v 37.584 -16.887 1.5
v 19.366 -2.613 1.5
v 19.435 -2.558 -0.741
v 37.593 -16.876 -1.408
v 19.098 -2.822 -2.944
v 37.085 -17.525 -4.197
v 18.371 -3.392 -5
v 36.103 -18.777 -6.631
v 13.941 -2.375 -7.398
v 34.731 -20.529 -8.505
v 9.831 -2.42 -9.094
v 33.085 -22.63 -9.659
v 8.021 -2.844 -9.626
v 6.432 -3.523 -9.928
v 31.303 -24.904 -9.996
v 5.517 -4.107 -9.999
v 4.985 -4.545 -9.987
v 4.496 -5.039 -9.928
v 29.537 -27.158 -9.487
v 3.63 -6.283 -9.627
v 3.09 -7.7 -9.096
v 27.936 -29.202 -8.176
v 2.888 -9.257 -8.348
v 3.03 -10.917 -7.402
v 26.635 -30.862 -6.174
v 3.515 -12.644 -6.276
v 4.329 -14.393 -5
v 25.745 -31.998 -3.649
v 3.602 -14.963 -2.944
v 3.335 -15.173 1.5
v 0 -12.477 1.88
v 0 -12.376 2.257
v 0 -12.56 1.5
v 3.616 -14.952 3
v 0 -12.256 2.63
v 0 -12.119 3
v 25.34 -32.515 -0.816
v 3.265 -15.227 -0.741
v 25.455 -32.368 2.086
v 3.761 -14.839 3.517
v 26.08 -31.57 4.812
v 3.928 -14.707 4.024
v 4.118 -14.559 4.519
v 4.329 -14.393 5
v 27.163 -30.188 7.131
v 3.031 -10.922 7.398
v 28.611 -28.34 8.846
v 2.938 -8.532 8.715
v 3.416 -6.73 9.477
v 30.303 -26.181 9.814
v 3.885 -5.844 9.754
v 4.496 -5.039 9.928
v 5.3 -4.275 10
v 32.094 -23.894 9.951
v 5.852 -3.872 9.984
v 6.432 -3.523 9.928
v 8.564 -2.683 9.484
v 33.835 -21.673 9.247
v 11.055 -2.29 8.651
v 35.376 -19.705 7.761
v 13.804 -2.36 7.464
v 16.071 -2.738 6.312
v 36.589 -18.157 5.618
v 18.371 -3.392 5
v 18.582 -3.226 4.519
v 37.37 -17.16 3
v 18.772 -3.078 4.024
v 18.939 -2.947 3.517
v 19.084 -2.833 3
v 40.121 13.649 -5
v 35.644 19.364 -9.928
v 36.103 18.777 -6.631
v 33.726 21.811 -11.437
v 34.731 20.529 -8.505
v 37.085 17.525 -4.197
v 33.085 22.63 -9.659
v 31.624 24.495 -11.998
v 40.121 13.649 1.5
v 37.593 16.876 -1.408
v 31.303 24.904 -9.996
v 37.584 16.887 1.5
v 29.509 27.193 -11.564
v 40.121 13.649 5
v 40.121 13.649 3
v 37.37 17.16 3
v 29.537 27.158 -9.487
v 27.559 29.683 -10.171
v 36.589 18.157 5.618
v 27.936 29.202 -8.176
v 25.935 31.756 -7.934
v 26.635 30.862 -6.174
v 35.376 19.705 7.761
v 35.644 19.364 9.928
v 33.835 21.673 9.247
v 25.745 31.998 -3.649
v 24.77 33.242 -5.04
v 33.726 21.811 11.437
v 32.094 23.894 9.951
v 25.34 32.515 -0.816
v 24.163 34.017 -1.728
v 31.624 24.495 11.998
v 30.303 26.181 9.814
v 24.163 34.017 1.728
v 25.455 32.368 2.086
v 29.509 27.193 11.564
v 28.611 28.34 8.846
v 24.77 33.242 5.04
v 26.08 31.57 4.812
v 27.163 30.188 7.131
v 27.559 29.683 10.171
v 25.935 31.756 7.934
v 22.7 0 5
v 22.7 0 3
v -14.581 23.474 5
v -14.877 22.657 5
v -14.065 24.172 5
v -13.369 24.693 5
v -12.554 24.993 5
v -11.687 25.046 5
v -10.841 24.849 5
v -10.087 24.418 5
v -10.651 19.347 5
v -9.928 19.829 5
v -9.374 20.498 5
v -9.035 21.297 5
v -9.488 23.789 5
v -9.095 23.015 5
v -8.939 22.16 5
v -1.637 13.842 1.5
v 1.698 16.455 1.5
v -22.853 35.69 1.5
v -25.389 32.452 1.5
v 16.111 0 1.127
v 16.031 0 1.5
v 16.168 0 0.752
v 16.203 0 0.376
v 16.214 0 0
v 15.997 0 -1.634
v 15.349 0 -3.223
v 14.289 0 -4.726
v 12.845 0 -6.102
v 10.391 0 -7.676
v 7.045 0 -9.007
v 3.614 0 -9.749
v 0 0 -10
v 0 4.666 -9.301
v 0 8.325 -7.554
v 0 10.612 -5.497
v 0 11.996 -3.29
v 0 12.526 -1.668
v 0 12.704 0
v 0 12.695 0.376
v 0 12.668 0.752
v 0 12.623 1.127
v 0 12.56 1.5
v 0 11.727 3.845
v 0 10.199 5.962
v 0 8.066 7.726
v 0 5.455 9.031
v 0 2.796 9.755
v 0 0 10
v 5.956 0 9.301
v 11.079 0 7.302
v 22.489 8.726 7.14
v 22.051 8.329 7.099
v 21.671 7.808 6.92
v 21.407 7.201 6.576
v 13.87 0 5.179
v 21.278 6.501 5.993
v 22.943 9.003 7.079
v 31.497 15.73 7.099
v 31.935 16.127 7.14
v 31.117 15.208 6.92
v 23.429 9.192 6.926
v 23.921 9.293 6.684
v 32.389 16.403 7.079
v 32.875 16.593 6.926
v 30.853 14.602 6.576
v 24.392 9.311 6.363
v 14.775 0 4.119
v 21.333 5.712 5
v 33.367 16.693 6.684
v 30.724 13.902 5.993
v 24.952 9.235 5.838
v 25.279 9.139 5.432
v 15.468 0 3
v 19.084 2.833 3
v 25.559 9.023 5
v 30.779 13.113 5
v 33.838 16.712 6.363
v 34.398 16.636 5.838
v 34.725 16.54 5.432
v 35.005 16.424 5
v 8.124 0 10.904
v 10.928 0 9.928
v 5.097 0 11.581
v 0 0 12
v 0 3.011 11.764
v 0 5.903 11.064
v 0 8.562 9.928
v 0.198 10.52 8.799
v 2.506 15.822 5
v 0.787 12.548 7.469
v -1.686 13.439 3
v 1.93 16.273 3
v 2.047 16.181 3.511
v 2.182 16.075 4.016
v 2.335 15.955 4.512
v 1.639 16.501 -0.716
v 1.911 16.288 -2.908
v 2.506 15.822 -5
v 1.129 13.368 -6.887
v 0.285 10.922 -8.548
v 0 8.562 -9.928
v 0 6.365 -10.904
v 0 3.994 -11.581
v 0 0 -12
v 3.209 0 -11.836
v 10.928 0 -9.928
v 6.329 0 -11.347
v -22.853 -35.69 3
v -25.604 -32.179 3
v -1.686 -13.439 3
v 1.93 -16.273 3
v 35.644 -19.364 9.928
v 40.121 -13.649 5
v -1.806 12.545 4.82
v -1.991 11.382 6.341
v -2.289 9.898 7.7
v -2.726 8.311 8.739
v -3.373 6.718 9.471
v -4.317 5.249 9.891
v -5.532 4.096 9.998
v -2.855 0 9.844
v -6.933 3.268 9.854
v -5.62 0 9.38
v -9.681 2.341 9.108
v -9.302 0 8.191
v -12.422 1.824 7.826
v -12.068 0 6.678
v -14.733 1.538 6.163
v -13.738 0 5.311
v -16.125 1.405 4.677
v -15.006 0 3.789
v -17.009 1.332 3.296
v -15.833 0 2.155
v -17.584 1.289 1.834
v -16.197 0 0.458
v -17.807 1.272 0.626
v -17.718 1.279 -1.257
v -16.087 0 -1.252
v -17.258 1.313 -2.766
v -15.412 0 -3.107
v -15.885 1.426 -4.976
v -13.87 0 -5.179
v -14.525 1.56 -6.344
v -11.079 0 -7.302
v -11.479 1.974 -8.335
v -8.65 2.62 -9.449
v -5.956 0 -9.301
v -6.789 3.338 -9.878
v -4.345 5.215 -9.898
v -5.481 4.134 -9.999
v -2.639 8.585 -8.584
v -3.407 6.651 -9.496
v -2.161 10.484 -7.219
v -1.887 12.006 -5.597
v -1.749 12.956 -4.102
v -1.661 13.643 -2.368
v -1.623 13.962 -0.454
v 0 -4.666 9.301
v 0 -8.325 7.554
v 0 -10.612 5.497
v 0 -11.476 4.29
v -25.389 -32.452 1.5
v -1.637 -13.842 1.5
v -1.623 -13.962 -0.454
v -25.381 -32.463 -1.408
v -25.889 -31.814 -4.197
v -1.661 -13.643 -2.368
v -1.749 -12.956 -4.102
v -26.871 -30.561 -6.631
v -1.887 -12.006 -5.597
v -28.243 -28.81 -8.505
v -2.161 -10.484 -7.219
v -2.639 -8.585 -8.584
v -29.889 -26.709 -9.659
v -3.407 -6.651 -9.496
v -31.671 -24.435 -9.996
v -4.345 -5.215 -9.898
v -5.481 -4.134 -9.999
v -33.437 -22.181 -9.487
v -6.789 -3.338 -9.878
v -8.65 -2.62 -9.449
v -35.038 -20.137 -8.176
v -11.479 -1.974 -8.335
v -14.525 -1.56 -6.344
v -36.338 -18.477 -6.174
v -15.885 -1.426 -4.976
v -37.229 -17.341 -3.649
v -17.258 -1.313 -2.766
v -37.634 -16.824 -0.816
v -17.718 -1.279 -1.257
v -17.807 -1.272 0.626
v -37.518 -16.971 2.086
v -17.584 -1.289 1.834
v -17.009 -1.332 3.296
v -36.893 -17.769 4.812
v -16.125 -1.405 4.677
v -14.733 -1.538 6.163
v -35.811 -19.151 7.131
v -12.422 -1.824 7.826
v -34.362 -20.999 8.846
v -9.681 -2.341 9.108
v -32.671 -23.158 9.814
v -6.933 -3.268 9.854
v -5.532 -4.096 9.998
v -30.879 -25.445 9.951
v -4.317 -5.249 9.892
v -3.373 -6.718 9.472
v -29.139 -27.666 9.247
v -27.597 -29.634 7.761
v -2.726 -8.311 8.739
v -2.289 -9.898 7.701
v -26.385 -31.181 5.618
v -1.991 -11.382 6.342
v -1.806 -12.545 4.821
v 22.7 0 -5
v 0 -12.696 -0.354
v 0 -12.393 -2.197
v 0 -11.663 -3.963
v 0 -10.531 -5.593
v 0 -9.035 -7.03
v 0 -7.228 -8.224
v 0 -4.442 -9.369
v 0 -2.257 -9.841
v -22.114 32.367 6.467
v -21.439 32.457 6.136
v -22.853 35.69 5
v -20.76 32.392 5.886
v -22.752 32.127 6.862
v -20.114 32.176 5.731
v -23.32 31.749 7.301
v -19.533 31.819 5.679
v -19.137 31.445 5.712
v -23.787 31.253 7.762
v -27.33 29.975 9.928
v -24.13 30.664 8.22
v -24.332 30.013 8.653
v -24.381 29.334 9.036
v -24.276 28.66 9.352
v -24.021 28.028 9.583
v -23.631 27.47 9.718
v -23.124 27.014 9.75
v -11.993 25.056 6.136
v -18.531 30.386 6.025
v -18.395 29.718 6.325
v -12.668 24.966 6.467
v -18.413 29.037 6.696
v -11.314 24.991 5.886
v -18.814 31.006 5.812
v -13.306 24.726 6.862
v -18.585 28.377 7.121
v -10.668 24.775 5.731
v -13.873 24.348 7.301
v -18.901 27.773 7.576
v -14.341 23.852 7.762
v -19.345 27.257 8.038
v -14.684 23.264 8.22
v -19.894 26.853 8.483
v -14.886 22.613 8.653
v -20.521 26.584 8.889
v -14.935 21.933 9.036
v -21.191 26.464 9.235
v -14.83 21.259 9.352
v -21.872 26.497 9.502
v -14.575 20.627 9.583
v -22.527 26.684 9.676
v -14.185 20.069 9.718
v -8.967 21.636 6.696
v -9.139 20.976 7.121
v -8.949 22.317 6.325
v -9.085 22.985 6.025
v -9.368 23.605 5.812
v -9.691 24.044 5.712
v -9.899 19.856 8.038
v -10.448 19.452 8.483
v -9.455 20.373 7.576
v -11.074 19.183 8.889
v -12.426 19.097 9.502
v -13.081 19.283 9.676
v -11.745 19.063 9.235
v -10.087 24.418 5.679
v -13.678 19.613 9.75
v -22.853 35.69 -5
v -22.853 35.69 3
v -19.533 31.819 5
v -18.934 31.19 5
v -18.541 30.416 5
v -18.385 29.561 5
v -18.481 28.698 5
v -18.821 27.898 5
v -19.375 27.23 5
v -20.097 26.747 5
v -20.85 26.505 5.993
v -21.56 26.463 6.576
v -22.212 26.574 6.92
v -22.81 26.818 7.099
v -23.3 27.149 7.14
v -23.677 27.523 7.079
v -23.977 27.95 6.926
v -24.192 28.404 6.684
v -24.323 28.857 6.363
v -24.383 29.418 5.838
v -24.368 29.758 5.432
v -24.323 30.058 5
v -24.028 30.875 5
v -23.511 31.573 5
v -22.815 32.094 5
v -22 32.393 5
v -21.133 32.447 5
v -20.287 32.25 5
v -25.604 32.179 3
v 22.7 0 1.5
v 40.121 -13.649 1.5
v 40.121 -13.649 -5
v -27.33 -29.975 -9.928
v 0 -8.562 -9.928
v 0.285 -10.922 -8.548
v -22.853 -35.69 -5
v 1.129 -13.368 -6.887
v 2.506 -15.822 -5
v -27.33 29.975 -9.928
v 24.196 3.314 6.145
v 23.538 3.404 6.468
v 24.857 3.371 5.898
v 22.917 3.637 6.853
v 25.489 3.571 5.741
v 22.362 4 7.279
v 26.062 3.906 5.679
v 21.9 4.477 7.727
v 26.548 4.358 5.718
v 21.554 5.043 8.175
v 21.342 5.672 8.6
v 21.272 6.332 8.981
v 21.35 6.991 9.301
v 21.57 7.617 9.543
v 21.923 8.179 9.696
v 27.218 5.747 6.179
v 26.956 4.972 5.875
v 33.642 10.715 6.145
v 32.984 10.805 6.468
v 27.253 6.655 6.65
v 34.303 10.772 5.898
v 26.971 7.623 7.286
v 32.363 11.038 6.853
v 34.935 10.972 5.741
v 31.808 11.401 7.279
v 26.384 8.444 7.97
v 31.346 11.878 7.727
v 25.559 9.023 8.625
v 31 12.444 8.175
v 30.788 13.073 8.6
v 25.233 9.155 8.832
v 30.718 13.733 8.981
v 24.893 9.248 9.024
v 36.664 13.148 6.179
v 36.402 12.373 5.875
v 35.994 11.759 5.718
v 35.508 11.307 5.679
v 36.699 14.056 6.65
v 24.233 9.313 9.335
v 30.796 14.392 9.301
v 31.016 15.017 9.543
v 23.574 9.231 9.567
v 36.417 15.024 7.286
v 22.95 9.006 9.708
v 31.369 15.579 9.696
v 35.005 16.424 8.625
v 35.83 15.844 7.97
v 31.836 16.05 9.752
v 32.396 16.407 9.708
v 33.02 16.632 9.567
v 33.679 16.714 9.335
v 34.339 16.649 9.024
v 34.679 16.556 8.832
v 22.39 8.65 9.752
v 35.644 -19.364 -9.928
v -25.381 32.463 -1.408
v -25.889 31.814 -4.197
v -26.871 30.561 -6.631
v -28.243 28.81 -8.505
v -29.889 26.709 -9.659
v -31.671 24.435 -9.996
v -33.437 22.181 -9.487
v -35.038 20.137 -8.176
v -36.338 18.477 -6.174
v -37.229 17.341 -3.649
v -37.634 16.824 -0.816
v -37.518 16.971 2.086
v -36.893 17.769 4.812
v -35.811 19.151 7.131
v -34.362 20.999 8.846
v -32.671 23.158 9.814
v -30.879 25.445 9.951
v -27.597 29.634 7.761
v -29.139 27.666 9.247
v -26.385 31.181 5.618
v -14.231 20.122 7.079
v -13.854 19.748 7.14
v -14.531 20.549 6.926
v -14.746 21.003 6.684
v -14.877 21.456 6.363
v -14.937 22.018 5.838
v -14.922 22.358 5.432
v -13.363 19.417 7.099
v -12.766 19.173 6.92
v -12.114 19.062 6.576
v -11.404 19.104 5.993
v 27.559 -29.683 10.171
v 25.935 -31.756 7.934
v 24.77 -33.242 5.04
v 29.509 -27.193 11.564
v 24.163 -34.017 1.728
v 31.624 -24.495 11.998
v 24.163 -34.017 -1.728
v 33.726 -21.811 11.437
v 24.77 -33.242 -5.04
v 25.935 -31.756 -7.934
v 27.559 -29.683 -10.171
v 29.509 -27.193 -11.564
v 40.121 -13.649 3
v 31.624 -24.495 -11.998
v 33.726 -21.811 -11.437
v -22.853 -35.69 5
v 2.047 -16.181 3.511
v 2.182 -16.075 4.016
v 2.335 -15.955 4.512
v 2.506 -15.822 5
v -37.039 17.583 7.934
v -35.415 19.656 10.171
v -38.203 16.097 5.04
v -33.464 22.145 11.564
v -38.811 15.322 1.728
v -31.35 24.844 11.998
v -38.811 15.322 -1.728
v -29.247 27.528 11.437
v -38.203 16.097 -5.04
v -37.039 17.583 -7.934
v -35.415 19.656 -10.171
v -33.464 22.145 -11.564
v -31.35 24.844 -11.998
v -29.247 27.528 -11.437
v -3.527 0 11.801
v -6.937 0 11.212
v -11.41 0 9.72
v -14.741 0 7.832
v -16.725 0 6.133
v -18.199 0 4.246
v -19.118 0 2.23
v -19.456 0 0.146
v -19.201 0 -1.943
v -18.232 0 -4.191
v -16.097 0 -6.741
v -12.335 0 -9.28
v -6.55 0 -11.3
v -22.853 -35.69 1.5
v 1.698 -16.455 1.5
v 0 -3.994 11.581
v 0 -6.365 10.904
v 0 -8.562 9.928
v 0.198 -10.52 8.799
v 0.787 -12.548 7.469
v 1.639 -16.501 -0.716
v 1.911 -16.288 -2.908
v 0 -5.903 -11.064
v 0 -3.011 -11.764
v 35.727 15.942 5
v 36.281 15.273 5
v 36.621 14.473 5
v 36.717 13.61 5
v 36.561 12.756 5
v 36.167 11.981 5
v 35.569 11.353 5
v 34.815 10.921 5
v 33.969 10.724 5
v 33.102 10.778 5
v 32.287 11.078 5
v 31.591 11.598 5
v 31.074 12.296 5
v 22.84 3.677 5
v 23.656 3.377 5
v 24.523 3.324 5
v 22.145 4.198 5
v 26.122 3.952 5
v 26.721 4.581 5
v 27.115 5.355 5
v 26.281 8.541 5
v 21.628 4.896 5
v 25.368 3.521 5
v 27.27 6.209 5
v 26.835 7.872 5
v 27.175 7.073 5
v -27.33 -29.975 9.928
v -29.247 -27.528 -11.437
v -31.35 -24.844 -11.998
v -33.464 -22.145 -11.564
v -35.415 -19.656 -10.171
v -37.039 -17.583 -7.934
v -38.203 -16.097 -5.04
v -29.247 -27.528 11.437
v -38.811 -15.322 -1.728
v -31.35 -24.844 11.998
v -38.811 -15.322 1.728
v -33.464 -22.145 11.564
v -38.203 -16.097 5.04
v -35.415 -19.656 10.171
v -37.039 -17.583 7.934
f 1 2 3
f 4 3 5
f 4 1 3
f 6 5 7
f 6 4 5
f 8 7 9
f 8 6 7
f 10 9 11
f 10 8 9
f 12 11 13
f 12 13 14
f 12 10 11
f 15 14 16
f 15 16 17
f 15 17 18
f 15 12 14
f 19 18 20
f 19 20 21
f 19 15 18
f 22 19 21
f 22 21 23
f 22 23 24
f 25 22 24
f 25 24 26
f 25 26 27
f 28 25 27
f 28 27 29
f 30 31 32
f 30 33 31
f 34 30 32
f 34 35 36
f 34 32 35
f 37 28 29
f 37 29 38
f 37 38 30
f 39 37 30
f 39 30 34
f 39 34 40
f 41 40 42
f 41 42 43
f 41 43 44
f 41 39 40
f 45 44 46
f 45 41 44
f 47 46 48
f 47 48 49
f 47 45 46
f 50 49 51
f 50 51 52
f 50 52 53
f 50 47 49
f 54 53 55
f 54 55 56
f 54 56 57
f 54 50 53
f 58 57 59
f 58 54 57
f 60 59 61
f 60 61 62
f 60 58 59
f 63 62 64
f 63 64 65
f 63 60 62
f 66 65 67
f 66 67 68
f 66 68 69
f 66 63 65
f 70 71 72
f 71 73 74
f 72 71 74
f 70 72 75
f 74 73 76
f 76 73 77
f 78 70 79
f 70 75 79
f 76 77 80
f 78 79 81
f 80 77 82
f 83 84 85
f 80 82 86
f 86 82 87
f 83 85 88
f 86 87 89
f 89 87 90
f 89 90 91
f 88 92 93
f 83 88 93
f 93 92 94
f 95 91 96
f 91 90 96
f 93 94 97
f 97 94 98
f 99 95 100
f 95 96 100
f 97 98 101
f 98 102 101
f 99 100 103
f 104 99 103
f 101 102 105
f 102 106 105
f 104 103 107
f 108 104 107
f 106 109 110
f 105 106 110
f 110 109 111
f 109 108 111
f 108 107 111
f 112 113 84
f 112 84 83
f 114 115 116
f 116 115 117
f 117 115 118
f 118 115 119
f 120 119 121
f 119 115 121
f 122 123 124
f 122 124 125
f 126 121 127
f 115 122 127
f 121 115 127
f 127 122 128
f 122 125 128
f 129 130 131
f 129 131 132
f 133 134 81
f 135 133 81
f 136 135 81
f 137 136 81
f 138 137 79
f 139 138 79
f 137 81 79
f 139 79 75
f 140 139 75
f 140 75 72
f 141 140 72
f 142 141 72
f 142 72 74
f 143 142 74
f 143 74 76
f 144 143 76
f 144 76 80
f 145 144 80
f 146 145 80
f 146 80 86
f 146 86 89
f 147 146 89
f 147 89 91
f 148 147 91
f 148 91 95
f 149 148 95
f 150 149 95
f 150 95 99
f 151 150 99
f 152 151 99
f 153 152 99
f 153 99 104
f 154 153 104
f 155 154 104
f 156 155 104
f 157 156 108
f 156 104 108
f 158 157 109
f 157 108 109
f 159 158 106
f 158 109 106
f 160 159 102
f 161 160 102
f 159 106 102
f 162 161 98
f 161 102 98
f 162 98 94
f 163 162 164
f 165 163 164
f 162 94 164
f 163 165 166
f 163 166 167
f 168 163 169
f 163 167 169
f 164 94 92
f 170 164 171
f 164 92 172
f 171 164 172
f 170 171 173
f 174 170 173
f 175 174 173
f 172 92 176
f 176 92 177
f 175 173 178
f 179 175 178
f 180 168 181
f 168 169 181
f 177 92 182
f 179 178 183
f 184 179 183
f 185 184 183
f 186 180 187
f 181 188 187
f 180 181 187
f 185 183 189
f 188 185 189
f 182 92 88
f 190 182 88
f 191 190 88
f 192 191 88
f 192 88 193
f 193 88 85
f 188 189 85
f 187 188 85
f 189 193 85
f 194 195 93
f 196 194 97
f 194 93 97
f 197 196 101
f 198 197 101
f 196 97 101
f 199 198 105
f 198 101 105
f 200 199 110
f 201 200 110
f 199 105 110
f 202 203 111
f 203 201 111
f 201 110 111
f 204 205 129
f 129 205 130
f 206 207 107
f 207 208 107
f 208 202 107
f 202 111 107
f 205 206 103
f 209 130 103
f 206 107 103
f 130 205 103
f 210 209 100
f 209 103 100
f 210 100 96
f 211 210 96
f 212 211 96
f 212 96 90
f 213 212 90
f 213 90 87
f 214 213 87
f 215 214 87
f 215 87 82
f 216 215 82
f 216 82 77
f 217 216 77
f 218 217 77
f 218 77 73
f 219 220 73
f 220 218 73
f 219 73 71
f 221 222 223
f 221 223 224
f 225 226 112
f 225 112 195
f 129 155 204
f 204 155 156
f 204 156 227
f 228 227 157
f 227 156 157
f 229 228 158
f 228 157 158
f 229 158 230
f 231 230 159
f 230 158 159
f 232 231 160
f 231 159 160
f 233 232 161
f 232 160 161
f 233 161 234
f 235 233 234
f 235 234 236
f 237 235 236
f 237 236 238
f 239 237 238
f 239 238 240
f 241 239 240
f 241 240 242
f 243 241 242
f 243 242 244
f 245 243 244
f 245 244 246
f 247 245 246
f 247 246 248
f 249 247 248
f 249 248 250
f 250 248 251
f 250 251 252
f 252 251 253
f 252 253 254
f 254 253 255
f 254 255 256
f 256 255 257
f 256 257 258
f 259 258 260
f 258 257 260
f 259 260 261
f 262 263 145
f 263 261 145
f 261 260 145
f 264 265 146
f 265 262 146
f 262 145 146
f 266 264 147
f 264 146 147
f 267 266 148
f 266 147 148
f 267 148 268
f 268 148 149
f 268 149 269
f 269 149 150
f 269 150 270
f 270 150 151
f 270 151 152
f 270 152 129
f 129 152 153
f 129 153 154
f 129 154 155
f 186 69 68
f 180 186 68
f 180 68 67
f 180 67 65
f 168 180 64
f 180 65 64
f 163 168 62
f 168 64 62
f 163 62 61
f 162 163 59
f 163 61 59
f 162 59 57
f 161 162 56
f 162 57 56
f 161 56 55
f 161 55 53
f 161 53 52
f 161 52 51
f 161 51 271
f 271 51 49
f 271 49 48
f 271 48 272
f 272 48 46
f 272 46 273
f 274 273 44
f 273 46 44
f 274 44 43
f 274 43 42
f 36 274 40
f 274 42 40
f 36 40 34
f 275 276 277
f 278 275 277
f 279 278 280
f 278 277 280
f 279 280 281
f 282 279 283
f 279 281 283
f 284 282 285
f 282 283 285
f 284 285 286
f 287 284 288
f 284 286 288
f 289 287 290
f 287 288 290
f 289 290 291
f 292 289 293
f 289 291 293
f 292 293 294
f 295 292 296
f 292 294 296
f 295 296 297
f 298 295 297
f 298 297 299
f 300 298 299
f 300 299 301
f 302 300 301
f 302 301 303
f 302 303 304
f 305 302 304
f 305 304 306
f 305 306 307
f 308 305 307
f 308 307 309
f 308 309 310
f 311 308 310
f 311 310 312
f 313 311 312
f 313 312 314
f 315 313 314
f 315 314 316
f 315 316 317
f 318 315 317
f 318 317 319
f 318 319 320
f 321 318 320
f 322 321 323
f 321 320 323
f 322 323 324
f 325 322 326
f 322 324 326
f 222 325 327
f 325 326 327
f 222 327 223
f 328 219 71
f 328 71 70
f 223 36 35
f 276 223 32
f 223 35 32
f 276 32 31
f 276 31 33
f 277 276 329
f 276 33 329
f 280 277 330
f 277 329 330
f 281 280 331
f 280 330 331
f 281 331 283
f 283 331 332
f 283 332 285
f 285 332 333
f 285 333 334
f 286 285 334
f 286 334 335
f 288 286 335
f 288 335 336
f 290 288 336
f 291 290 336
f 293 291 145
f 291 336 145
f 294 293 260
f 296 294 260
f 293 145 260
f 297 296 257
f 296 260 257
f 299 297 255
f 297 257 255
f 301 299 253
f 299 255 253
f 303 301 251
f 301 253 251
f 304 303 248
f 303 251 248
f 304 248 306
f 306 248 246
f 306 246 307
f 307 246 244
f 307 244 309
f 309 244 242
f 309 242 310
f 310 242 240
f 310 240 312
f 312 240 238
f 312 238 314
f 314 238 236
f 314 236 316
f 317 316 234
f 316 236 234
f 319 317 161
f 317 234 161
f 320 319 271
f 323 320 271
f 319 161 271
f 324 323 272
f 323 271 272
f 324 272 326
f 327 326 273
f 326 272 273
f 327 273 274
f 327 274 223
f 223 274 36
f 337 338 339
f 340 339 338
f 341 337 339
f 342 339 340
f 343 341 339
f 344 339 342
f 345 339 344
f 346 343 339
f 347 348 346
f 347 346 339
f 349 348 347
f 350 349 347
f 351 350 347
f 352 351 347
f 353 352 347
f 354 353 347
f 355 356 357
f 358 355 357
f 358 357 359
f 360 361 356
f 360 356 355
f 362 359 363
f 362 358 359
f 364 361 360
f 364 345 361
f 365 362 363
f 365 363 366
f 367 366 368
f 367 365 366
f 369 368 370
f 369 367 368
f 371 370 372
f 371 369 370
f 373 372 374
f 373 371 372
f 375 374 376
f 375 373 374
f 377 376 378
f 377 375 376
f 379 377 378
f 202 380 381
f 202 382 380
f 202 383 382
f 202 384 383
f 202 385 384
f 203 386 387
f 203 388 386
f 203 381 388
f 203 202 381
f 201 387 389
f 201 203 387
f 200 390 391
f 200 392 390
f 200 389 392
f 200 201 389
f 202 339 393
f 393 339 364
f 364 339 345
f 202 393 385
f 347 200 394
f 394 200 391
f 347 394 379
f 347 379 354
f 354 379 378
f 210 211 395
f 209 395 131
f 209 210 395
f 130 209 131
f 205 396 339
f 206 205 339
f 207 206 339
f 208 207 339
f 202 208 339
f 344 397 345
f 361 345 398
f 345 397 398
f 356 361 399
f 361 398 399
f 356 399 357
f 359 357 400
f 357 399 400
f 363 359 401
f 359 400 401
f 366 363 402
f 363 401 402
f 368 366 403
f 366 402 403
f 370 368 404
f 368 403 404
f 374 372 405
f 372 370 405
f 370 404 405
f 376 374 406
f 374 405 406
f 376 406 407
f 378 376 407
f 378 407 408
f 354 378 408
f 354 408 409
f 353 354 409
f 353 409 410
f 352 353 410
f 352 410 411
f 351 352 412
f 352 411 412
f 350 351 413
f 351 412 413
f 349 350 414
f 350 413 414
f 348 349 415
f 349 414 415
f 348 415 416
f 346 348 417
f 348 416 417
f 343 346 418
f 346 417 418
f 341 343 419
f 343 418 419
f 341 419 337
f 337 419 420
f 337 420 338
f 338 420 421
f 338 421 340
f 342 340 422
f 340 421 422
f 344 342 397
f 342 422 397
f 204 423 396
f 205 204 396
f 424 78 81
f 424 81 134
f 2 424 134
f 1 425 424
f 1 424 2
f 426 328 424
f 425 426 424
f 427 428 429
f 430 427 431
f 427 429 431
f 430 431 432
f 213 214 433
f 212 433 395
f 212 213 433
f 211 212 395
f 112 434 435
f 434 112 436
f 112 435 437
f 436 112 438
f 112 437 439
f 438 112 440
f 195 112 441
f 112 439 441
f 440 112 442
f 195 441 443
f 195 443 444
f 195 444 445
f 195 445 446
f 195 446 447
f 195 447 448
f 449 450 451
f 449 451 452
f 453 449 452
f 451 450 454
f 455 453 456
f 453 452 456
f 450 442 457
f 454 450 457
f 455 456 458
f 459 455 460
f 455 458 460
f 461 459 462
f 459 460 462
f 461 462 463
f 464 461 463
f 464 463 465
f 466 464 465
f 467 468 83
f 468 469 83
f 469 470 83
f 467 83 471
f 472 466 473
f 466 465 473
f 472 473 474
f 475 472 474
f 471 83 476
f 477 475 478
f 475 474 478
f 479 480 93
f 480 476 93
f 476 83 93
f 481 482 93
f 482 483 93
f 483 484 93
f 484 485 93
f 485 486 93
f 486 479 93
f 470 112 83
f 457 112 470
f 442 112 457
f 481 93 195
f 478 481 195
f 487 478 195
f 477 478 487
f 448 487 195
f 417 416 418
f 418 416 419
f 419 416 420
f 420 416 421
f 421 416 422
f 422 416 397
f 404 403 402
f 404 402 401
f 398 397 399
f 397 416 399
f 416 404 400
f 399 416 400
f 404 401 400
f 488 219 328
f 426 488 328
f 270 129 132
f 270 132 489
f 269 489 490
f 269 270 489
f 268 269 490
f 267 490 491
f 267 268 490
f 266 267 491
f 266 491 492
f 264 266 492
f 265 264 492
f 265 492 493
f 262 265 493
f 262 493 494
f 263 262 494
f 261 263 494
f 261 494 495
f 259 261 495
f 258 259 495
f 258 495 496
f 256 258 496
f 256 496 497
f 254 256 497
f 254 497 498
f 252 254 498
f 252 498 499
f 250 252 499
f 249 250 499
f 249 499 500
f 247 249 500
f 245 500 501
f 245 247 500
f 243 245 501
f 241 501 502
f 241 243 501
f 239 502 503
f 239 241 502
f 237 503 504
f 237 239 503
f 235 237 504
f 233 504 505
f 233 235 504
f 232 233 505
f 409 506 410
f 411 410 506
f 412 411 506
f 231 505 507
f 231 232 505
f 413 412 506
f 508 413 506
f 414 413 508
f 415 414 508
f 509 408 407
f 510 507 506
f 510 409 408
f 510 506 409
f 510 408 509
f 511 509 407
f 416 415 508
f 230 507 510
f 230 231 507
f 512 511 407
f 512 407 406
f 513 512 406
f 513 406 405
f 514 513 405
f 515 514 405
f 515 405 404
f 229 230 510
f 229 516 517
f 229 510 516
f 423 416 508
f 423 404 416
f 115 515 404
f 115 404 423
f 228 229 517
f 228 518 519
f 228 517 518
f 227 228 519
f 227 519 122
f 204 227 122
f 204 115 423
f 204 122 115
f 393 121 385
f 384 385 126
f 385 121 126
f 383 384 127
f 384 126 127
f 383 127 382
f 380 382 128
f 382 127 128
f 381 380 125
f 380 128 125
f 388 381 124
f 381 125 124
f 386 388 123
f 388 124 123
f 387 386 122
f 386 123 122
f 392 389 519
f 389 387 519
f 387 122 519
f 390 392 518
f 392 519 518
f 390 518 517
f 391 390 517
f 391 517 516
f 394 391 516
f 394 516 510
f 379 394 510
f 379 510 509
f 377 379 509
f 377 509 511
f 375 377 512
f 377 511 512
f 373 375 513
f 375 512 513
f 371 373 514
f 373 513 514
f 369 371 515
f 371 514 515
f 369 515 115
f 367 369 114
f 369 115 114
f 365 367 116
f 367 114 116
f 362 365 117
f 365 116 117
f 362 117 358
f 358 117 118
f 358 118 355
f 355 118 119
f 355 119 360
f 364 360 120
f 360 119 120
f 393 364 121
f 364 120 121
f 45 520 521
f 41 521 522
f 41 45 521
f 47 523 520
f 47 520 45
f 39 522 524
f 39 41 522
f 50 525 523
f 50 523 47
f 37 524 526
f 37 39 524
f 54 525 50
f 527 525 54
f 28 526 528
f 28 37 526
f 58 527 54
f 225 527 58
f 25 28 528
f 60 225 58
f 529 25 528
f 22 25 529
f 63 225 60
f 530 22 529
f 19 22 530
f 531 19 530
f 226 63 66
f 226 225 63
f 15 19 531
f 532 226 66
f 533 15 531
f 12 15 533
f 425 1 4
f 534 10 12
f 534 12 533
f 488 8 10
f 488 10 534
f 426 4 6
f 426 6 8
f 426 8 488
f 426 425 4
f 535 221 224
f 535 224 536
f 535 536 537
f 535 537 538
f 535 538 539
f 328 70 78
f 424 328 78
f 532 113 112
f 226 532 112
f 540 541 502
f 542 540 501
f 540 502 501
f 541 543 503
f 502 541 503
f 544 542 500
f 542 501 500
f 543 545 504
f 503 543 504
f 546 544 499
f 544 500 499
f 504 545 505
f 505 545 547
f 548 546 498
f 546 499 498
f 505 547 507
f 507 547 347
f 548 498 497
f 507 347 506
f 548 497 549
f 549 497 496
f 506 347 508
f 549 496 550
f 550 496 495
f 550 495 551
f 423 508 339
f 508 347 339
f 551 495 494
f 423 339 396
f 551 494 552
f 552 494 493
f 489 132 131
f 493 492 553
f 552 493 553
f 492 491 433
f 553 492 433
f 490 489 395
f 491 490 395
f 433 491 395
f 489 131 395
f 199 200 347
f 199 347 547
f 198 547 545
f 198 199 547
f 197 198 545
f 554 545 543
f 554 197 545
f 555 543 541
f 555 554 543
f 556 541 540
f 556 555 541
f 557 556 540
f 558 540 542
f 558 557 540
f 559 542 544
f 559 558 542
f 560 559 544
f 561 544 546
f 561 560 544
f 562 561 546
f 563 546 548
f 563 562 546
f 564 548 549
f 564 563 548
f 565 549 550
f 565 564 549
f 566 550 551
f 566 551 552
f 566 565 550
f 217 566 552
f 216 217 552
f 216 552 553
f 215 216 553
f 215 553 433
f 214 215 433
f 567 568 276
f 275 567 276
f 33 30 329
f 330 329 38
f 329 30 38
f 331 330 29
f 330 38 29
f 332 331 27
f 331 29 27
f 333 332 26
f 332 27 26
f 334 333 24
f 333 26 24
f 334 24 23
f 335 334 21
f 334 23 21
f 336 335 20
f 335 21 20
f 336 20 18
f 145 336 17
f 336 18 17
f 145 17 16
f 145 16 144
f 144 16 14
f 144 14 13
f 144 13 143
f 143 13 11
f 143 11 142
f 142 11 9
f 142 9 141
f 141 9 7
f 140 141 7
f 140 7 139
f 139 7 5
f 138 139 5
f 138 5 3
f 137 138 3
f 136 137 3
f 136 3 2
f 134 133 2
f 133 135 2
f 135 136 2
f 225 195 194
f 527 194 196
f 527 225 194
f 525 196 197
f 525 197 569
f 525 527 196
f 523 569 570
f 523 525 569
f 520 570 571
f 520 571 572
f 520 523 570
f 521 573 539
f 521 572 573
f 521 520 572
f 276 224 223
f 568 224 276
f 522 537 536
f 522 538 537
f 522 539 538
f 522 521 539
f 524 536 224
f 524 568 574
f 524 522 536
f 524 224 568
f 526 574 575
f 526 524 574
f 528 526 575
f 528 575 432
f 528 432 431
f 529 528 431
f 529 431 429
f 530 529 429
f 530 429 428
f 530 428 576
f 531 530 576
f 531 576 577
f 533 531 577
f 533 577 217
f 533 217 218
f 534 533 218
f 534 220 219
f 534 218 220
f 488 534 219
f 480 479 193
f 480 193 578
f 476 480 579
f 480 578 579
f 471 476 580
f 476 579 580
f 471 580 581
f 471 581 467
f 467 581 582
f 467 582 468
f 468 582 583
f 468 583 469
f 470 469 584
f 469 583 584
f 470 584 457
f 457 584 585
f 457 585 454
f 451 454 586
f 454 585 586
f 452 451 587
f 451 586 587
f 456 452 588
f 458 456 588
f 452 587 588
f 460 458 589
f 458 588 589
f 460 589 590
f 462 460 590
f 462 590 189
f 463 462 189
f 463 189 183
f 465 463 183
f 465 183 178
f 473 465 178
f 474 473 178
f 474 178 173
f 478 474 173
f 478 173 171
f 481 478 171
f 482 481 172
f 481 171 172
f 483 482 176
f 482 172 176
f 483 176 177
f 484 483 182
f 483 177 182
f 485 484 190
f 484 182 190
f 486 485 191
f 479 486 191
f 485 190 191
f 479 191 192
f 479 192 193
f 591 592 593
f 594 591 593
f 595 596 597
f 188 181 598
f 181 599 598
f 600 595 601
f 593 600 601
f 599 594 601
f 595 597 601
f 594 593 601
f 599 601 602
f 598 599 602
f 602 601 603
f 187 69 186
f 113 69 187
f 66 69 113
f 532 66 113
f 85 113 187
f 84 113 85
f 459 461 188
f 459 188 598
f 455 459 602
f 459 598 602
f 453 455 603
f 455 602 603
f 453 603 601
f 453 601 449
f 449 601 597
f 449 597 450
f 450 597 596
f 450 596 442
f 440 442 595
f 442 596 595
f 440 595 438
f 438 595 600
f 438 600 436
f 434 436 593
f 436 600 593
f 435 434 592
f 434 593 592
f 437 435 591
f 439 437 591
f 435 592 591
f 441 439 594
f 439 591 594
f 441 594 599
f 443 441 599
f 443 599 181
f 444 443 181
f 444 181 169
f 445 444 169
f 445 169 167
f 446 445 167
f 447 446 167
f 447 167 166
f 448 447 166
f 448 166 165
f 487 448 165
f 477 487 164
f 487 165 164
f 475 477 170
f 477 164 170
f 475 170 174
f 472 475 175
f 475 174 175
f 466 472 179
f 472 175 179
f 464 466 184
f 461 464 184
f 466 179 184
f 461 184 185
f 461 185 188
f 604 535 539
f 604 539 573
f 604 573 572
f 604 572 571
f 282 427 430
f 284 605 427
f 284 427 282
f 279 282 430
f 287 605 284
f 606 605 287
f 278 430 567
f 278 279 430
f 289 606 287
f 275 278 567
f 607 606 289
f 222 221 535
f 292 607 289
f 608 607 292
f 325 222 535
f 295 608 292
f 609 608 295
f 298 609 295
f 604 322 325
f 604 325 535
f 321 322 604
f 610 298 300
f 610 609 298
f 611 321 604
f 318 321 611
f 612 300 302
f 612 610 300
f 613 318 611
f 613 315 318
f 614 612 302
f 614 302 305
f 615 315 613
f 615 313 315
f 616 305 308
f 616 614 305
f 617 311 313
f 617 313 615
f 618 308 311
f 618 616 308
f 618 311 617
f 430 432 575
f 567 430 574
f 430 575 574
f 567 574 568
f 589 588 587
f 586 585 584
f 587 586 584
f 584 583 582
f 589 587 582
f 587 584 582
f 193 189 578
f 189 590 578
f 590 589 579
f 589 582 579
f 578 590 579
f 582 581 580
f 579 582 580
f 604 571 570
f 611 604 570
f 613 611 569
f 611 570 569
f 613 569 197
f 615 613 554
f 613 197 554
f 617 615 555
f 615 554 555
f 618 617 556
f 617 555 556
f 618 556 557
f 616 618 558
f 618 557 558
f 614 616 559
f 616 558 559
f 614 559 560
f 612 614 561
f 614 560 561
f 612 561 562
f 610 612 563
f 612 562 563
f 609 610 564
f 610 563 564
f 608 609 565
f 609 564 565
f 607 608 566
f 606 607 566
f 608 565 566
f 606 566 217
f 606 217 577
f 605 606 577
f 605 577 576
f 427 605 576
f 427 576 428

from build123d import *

# Parameters (mm, degrees)
BOSS_EXTRU_1_DEPTH      = 80
BOSS_EXTRU_2_DEPTH      = 80
ESQUISSE6_R             = 10
ENL_V_MAT_EXTRU_1_DEPTH = 94.48690022224822
ESQUISSE7_R             = 10.000000000000004
ENL_V_MAT_EXTRU_2_DEPTH = 94.48690022224821
ENL_V_START             = -2
ESQUISSE8_R             = 2.9999999999999973
ESQUISSE8_R_2           = 3.0000000000000004
ENL_V_MAT_EXTRU_3_DEPTH = 10


with BuildPart() as part:
    # Esquisse4 → Boss.-Extru.1 (new body)
    with BuildSketch(Plane(origin=(31.486834784070687, 24.669398762041954, 0), x_dir=(0, 0, 1), z_dir=(-0.7871708696017671, -0.6167349690510487, 0))):
        with BuildLine():
            Line((-9.92847971530262, -6.739828673106199), (-5.000000000000012, -13.999999999999998))
            Line((-5.000000000000012, -13.999999999999998), (1.4999999999999891, -14.000000000000004))
            Line((1.4999999999999891, -14.000000000000004), (1.4999999999999891, -9.886859966642595))
            ThreePointArc((1.4999999999999891, -9.886859966642595), (-2.2566974751833473, 9.742038621638756), (2.9999999999999933, -9.539392014169461))
            Line((2.9999999999999933, -9.539392014169461), (2.999999999999988, -14.000000000000005))
            Line((2.999999999999988, -14.000000000000005), (4.999999999999987, -14.000000000000009))
            Line((4.999999999999987, -14.000000000000009), (9.928479715302606, -6.739828673106216))
            ThreePointArc((9.928479715302606, -6.739828673106216), (1.807e-14, 12), (-9.92847971530262, -6.739828673106199))
        make_face()
    extrude(amount=BOSS_EXTRU_1_DEPTH)

    # Esquisse5 → Boss.-Extru.2 (add)
    with BuildSketch(Plane(origin=(31.48683478407068, -24.66939876204195, 0), x_dir=(0, 0, -1), z_dir=(0.7871708696017671, -0.6167349690510487, 0))):
        with BuildLine():
            Line((9.9284797153026, 6.7398286731062225), (4.999999999999976, 14.000000000000009))
            Line((4.999999999999976, 14.000000000000009), (-1.5000000000000255, 13.999999999999995))
            Line((-1.5000000000000255, 13.999999999999995), (-1.5000000000000149, 9.88685996664259))
            ThreePointArc((-1.5000000000000149, 9.88685996664259), (2.256697475183369, -9.742038621638747), (-3.0000000000000173, 9.53939201416945))
            Line((-3.0000000000000173, 9.53939201416945), (-3.0000000000000244, 13.999999999999996))
            Line((-3.0000000000000244, 13.999999999999996), (-5.000000000000023, 13.999999999999991))
            Line((-5.000000000000023, 13.999999999999991), (-9.928479715302622, 6.739828673106189))
            ThreePointArc((-9.928479715302622, 6.739828673106189), (1.777e-14, -11.999999999999998), (9.9284797153026, 6.7398286731062225))
        make_face()
    extrude(amount=-BOSS_EXTRU_2_DEPTH)

    # Esquisse6 → Enlèv. mat.-Extru.1 (cut, through all)
    with BuildSketch(Plane(origin=(31.486834784070695, 24.669398762041958, 0), x_dir=(0, 0, -1), z_dir=(0.7871708696017669, 0.6167349690510489, 0))):
        with Locations(Location((0, 6.94e-15, 0), (0, 0, 252.542396876))):
            Circle(ESQUISSE6_R)
    extrude(amount=-ENL_V_MAT_EXTRU_1_DEPTH, mode=Mode.SUBTRACT)

    # Esquisse7 → Enlèv. mat.-Extru.2 (cut, through all)
    with BuildSketch(Plane(origin=(31.486834784070687, -24.669398762041954, 0), x_dir=(0, 0, -1), z_dir=(0.7871708696017669, -0.6167349690510489, 0))):
        with Locations(Location((0, -6.94e-15, 0), (0, 0, 98.626926559))):
            Circle(ESQUISSE7_R)
    extrude(amount=-ENL_V_MAT_EXTRU_2_DEPTH, mode=Mode.SUBTRACT)

    # Esquisse8 → Enlèv. mat.-Extru.3 (cut)
    with BuildSketch(Plane(origin=(5e-17, -5.97e-15, 2.999999999999953), x_dir=(-1, 0, 2e-17), z_dir=(-2e-17, 1.99e-15, -1)).offset(ENL_V_START)):
        with Locations(Location((21.383630745551354, 29.45743261280437, 0), (0, 0, 128.078094677))):
            Circle(ESQUISSE8_R)
        with Locations(Location((11.937580310330151, 22.056612984191787, 0), (0, 0, 128.078094677))):
            Circle(ESQUISSE8_R_2)
        with Locations(Location((-24.272279691351134, 6.31319559215644, 0), (0, 0, 115.397306959))):
            Circle(ESQUISSE8_R)
        with Locations(Location((-33.71833012657233, 13.714015220769031, 0), (0, 0, 115.397306959))):
            Circle(ESQUISSE8_R_2)
    extrude(amount=-ENL_V_MAT_EXTRU_3_DEPTH, mode=Mode.SUBTRACT)


solid = part.part
